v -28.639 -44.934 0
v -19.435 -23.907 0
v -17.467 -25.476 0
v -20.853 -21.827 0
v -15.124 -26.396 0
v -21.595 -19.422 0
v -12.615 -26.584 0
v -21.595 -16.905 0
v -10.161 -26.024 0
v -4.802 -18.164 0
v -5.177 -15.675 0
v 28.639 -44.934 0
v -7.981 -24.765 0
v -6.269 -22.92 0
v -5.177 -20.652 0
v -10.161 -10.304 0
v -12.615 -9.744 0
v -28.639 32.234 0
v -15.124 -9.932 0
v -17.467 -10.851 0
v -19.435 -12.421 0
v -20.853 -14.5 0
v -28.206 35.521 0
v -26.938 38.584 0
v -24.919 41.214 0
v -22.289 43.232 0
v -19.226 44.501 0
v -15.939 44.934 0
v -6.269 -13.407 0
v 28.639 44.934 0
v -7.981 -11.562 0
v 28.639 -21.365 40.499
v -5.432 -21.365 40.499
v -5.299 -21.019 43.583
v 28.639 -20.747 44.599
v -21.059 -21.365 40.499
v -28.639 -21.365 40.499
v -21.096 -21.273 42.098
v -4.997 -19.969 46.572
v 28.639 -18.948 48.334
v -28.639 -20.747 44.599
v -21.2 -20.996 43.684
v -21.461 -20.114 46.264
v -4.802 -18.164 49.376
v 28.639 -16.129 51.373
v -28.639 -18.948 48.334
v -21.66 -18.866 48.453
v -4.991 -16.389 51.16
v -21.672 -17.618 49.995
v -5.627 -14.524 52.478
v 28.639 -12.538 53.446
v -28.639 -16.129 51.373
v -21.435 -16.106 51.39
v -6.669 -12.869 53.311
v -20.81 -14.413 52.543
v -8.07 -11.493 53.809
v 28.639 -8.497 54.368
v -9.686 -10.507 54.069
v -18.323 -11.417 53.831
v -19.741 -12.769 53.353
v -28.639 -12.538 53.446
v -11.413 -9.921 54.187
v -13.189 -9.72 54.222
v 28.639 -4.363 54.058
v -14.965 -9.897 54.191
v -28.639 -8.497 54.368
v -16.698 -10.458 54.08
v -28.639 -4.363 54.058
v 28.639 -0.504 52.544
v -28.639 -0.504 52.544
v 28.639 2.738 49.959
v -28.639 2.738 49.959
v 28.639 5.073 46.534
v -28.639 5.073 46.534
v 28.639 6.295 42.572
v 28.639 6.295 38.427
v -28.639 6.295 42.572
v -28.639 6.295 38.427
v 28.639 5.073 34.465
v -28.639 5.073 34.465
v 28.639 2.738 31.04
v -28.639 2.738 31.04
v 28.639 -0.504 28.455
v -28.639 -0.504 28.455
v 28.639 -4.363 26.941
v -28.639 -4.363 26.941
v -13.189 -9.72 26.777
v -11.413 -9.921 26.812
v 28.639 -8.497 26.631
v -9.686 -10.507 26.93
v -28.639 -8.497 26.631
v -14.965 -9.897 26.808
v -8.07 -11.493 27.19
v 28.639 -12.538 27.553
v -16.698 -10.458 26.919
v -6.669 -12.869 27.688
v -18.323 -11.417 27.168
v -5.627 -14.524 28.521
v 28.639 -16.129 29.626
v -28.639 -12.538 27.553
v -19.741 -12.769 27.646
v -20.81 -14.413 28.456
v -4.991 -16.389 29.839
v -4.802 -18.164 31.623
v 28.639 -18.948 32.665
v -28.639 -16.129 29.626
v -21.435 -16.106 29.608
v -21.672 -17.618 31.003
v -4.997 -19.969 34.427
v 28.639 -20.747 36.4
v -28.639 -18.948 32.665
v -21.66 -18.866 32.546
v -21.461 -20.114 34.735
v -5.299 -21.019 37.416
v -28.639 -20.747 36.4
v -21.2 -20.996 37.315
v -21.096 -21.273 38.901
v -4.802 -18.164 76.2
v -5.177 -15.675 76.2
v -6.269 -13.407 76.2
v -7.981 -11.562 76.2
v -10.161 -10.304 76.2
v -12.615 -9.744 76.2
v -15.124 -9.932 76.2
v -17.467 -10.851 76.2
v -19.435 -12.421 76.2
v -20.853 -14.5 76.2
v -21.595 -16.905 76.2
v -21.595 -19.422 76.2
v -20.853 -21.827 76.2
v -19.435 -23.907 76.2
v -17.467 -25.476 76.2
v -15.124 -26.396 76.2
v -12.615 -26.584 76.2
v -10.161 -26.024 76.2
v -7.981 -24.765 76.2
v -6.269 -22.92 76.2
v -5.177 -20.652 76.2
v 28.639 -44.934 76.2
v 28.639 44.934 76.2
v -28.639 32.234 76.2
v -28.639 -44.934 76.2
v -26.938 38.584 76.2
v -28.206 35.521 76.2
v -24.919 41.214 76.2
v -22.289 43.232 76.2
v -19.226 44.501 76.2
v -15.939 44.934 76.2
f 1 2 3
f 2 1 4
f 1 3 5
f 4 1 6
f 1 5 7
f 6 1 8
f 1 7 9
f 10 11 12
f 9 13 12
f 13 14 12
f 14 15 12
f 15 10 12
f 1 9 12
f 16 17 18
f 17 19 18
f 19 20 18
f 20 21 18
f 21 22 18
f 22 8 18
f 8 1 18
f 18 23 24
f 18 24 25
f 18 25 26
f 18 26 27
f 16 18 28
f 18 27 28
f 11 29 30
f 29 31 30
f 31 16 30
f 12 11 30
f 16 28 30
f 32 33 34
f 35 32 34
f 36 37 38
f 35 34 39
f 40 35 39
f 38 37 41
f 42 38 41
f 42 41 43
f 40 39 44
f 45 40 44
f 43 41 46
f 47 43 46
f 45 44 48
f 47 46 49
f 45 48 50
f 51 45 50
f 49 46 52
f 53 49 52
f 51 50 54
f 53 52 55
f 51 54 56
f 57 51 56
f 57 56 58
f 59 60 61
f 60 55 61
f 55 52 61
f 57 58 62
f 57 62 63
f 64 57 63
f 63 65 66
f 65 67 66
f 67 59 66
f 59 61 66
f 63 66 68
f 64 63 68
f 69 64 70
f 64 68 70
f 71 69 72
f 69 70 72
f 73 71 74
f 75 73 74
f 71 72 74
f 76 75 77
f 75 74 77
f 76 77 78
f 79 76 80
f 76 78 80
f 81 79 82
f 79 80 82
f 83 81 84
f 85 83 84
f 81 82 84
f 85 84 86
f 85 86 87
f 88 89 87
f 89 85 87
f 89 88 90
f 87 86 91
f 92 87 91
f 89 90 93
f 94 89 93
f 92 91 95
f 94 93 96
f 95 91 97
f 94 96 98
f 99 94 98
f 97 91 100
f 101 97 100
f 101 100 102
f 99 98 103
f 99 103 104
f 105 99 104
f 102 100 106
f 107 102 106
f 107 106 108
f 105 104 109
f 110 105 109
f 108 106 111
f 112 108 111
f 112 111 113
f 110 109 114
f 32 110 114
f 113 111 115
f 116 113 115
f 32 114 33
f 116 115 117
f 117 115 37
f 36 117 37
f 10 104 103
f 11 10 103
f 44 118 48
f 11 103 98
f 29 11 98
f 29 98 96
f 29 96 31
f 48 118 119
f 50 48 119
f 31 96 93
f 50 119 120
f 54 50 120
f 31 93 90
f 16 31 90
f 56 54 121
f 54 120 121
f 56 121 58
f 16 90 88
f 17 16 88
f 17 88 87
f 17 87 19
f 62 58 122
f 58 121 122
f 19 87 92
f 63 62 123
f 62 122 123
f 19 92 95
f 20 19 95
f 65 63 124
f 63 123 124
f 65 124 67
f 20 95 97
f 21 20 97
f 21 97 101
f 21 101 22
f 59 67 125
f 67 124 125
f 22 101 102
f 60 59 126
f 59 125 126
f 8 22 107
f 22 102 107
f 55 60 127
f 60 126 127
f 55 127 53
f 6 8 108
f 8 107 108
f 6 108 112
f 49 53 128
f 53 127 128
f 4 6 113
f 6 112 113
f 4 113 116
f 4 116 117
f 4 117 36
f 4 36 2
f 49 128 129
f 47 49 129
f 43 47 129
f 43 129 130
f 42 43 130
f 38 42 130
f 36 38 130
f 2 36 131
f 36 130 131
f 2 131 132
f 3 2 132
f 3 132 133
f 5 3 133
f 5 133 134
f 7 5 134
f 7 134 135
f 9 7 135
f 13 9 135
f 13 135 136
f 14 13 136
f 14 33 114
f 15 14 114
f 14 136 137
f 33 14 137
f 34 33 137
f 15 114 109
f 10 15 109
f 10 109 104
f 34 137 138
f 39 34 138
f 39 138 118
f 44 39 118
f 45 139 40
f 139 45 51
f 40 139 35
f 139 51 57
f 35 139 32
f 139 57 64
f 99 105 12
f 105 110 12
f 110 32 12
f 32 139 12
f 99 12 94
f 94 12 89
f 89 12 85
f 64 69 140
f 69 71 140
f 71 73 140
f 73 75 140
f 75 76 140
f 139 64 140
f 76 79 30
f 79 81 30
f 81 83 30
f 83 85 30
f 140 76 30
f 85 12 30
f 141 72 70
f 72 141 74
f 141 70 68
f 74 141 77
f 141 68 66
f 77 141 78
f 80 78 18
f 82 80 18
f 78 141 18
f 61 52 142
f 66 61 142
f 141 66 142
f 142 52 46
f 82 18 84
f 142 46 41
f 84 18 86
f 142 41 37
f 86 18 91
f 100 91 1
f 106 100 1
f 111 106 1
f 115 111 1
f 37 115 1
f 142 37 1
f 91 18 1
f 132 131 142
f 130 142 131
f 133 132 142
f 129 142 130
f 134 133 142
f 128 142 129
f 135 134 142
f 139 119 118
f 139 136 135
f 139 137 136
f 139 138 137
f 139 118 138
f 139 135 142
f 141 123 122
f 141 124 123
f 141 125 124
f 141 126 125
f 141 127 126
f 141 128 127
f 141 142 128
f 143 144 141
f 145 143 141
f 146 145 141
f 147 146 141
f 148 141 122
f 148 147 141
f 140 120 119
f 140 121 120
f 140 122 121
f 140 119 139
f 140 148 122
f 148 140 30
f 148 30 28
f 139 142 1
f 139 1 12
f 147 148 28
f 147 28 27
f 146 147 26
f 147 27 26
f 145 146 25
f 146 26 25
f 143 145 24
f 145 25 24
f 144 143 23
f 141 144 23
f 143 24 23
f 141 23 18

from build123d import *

# Parameters (mm, degrees)
F1_DEPTH = 76.2
F2_R     = 8.443536
F3_DEPTH = 76.201
F4_R     = 13.907635
F5_DEPTH = 57.279376


with BuildPart() as f1:
    # F0 (on Top) → F1 (new body)
    with BuildSketch(Plane.XY):
        with BuildLine():
            Line((-28.639188, 32.2339), (-28.639188, -44.9339))
            Line((-28.639188, -44.9339), (28.639188, -44.9339))
            Line((28.639188, -44.9339), (28.639188, 44.9339))
            Line((28.639188, 44.9339), (-15.939188, 44.9339))
            ThreePointArc((-15.939188, 44.9339), (-24.919444, 41.214156), (-28.639188, 32.2339))
        make_face()
    extrude(amount=F1_DEPTH)

    # F2 (on face) → F3 (cut, through all)
    with BuildSketch(Plane.XY.offset(76.2)):
        with Locations((-13.24562, -18.163707)):
            Circle(F2_R)
    extrude(amount=-F3_DEPTH, mode=Mode.SUBTRACT)

    # F4 (on face) → F5 (cut, through all)
    with BuildSketch(Plane(origin=(-28.639188, 0, 0), x_dir=(0, -1, 0), z_dir=(-1, 0, 0))):
        with Locations((7.457322, 40.499449)):
            Circle(F4_R)
    extrude(amount=-F5_DEPTH, mode=Mode.SUBTRACT)


solid = f1.part
